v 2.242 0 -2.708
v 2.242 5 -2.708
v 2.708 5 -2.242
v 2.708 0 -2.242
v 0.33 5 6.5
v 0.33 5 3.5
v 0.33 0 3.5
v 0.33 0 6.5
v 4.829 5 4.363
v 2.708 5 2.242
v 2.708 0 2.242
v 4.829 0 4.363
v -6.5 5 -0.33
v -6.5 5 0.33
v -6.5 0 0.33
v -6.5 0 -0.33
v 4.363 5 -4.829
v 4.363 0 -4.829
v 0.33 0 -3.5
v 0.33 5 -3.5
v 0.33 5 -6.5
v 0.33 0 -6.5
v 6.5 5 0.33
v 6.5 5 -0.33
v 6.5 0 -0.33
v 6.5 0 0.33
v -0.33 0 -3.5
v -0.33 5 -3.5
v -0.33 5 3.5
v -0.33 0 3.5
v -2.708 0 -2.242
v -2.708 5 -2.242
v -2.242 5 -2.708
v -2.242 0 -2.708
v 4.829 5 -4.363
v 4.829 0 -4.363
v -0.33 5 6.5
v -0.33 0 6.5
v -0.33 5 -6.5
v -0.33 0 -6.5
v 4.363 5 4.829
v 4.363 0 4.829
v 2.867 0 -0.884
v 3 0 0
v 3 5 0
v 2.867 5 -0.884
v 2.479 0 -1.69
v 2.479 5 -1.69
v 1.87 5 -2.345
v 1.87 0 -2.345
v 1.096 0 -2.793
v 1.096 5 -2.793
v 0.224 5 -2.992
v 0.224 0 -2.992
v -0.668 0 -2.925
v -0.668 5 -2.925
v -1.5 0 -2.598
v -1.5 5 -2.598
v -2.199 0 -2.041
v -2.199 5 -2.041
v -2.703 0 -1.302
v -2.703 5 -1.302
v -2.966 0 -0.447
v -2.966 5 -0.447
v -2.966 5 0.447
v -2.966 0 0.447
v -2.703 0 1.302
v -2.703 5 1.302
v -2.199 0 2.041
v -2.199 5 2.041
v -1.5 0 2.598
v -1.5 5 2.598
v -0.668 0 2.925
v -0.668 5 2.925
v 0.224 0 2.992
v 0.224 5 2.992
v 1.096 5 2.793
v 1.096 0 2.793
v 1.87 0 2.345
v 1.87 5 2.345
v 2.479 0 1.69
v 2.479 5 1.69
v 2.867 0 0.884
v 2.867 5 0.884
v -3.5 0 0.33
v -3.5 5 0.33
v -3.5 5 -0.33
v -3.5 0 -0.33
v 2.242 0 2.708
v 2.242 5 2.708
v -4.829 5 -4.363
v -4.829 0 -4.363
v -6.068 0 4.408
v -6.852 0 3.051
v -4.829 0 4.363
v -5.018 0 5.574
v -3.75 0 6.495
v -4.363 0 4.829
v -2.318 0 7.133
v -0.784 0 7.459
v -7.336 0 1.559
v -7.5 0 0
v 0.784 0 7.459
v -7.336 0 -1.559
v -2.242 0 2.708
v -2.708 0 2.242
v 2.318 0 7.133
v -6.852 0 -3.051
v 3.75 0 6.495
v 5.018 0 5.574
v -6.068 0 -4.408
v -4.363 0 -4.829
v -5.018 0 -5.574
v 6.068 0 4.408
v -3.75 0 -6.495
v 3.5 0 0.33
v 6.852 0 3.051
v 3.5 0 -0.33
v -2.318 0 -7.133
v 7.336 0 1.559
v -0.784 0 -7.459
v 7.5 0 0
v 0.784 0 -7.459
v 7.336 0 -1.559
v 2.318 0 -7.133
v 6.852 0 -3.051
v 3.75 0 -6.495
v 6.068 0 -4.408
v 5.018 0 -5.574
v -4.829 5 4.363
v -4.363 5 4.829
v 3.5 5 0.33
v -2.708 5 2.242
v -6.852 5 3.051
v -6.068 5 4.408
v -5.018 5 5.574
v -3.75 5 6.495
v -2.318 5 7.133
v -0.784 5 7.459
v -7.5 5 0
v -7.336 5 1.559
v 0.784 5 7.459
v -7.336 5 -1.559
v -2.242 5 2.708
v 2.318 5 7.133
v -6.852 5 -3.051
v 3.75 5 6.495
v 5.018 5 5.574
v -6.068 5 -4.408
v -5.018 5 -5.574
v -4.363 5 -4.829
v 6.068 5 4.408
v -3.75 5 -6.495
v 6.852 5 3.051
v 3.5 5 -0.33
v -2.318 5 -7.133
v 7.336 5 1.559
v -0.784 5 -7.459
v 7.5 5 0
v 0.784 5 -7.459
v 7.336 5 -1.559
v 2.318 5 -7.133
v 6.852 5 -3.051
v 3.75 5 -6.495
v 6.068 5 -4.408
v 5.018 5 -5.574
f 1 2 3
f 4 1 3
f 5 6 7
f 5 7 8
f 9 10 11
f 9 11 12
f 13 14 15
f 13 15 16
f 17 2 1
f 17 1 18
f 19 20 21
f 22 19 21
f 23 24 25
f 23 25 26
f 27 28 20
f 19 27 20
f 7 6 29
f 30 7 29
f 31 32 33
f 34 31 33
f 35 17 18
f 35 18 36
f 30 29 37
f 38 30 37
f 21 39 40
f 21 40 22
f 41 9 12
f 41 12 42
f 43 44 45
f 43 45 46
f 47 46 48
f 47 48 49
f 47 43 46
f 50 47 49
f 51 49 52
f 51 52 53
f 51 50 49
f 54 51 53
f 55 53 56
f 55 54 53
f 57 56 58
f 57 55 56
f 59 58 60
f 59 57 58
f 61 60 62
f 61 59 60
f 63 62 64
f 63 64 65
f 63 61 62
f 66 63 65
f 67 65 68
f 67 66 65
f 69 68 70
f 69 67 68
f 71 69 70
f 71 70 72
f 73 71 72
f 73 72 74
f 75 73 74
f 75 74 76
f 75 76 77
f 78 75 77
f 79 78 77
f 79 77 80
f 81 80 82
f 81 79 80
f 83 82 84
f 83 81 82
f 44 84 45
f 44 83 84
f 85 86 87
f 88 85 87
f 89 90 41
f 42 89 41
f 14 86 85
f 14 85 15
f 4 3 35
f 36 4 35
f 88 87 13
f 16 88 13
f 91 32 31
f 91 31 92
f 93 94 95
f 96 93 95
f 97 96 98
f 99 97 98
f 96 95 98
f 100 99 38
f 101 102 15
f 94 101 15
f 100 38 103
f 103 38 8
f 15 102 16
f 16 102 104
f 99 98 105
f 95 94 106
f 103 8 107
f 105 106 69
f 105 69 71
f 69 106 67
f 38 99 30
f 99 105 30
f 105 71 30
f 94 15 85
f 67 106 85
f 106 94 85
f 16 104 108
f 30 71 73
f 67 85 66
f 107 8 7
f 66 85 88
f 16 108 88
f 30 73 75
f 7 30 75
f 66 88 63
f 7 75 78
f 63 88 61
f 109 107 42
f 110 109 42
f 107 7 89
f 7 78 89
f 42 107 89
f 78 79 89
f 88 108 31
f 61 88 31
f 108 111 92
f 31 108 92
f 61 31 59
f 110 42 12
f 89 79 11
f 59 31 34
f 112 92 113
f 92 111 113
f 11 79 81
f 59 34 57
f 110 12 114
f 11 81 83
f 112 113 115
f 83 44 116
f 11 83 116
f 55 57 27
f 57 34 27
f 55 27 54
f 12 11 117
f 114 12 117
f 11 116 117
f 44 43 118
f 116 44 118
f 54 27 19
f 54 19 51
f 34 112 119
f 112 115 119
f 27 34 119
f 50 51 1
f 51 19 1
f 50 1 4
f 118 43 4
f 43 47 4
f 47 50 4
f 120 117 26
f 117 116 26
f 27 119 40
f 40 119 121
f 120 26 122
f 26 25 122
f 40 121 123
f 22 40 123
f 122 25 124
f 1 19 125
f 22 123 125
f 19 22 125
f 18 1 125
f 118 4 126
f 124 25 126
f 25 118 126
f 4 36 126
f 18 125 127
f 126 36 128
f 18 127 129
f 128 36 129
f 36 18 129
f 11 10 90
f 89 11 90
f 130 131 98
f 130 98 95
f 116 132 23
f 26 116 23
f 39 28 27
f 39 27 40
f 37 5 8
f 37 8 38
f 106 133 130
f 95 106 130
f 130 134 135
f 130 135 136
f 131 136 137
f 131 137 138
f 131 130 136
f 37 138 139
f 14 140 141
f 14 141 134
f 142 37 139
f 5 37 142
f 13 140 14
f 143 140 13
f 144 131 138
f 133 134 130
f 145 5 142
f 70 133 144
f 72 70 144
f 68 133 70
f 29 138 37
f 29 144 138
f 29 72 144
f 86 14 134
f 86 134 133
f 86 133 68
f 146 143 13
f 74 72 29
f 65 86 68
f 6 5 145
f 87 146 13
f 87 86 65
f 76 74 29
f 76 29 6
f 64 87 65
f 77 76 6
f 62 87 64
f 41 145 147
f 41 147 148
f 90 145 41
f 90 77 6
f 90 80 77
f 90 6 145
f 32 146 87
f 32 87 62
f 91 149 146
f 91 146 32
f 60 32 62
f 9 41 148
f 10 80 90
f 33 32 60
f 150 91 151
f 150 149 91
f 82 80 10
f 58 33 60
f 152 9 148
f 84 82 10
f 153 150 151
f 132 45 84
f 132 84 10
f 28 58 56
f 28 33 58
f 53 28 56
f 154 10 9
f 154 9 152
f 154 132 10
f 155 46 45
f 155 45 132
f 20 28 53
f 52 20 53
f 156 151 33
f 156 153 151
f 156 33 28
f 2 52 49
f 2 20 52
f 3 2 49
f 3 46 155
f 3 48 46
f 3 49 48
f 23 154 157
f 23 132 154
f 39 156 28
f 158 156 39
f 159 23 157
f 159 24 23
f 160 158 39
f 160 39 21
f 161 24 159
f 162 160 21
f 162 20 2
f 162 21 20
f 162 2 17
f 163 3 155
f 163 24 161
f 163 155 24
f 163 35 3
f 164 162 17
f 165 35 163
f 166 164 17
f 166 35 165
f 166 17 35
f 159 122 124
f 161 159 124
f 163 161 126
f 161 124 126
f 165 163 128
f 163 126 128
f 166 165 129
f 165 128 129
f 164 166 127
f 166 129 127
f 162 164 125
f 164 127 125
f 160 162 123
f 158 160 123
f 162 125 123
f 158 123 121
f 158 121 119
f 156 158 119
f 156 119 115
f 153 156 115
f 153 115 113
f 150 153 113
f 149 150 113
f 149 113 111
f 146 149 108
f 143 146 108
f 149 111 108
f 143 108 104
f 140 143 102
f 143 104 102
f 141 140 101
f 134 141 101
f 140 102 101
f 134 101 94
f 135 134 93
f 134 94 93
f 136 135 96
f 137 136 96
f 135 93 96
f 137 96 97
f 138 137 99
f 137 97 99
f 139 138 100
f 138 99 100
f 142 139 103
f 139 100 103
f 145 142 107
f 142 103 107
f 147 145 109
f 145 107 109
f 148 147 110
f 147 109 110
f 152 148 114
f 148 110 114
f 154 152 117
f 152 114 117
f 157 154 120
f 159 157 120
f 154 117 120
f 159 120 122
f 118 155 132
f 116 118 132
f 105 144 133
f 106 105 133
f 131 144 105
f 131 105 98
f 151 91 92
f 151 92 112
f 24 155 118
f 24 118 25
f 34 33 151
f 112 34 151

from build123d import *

# Parameters (mm, degrees)
SKETCH_1_R               = 7.5
SKETCH_1_R_2             = 3
EXTRUDE_1_DEPTH          = 5
SKETCH_2_W               = 0.65965233
SKETCH_2_H               = 3
CUT_EXTRUDE_1_DEPTH      = 10
PATTERN_CIRCULAR_1_COUNT = 8


with BuildPart() as part:
    # Эскиз1 → Бобышка-Вытянуть1 (new body)
    with BuildSketch(Plane(origin=(0, 0, 0), x_dir=(1, 0, 0), z_dir=(0, 1, 0))):
        Circle(SKETCH_1_R)
        Circle(SKETCH_1_R_2, mode=Mode.SUBTRACT)
    extrude(amount=EXTRUDE_1_DEPTH)

    # Эскиз2 → Вырез-Вытянуть1 (cut)
    with BuildSketch(Plane(origin=(0, 5, 0), x_dir=(1, 0, 0), z_dir=(0, 1, 0))):
        with Locations((0, 5)):
            Rectangle(SKETCH_2_W, SKETCH_2_H)
    cut_extrude_1 = extrude(amount=-CUT_EXTRUDE_1_DEPTH, mode=Mode.SUBTRACT)

    # Круговой массив1: Вырез-Вытянуть1 ×8 about axis
    pattern_circular_1_axis = Axis((0, 0, 0), (0, 1, 0))
    for i in range(1, PATTERN_CIRCULAR_1_COUNT):
        add(cut_extrude_1.rotate(pattern_circular_1_axis, i * 360 / PATTERN_CIRCULAR_1_COUNT), mode=Mode.SUBTRACT)


solid = part.part
